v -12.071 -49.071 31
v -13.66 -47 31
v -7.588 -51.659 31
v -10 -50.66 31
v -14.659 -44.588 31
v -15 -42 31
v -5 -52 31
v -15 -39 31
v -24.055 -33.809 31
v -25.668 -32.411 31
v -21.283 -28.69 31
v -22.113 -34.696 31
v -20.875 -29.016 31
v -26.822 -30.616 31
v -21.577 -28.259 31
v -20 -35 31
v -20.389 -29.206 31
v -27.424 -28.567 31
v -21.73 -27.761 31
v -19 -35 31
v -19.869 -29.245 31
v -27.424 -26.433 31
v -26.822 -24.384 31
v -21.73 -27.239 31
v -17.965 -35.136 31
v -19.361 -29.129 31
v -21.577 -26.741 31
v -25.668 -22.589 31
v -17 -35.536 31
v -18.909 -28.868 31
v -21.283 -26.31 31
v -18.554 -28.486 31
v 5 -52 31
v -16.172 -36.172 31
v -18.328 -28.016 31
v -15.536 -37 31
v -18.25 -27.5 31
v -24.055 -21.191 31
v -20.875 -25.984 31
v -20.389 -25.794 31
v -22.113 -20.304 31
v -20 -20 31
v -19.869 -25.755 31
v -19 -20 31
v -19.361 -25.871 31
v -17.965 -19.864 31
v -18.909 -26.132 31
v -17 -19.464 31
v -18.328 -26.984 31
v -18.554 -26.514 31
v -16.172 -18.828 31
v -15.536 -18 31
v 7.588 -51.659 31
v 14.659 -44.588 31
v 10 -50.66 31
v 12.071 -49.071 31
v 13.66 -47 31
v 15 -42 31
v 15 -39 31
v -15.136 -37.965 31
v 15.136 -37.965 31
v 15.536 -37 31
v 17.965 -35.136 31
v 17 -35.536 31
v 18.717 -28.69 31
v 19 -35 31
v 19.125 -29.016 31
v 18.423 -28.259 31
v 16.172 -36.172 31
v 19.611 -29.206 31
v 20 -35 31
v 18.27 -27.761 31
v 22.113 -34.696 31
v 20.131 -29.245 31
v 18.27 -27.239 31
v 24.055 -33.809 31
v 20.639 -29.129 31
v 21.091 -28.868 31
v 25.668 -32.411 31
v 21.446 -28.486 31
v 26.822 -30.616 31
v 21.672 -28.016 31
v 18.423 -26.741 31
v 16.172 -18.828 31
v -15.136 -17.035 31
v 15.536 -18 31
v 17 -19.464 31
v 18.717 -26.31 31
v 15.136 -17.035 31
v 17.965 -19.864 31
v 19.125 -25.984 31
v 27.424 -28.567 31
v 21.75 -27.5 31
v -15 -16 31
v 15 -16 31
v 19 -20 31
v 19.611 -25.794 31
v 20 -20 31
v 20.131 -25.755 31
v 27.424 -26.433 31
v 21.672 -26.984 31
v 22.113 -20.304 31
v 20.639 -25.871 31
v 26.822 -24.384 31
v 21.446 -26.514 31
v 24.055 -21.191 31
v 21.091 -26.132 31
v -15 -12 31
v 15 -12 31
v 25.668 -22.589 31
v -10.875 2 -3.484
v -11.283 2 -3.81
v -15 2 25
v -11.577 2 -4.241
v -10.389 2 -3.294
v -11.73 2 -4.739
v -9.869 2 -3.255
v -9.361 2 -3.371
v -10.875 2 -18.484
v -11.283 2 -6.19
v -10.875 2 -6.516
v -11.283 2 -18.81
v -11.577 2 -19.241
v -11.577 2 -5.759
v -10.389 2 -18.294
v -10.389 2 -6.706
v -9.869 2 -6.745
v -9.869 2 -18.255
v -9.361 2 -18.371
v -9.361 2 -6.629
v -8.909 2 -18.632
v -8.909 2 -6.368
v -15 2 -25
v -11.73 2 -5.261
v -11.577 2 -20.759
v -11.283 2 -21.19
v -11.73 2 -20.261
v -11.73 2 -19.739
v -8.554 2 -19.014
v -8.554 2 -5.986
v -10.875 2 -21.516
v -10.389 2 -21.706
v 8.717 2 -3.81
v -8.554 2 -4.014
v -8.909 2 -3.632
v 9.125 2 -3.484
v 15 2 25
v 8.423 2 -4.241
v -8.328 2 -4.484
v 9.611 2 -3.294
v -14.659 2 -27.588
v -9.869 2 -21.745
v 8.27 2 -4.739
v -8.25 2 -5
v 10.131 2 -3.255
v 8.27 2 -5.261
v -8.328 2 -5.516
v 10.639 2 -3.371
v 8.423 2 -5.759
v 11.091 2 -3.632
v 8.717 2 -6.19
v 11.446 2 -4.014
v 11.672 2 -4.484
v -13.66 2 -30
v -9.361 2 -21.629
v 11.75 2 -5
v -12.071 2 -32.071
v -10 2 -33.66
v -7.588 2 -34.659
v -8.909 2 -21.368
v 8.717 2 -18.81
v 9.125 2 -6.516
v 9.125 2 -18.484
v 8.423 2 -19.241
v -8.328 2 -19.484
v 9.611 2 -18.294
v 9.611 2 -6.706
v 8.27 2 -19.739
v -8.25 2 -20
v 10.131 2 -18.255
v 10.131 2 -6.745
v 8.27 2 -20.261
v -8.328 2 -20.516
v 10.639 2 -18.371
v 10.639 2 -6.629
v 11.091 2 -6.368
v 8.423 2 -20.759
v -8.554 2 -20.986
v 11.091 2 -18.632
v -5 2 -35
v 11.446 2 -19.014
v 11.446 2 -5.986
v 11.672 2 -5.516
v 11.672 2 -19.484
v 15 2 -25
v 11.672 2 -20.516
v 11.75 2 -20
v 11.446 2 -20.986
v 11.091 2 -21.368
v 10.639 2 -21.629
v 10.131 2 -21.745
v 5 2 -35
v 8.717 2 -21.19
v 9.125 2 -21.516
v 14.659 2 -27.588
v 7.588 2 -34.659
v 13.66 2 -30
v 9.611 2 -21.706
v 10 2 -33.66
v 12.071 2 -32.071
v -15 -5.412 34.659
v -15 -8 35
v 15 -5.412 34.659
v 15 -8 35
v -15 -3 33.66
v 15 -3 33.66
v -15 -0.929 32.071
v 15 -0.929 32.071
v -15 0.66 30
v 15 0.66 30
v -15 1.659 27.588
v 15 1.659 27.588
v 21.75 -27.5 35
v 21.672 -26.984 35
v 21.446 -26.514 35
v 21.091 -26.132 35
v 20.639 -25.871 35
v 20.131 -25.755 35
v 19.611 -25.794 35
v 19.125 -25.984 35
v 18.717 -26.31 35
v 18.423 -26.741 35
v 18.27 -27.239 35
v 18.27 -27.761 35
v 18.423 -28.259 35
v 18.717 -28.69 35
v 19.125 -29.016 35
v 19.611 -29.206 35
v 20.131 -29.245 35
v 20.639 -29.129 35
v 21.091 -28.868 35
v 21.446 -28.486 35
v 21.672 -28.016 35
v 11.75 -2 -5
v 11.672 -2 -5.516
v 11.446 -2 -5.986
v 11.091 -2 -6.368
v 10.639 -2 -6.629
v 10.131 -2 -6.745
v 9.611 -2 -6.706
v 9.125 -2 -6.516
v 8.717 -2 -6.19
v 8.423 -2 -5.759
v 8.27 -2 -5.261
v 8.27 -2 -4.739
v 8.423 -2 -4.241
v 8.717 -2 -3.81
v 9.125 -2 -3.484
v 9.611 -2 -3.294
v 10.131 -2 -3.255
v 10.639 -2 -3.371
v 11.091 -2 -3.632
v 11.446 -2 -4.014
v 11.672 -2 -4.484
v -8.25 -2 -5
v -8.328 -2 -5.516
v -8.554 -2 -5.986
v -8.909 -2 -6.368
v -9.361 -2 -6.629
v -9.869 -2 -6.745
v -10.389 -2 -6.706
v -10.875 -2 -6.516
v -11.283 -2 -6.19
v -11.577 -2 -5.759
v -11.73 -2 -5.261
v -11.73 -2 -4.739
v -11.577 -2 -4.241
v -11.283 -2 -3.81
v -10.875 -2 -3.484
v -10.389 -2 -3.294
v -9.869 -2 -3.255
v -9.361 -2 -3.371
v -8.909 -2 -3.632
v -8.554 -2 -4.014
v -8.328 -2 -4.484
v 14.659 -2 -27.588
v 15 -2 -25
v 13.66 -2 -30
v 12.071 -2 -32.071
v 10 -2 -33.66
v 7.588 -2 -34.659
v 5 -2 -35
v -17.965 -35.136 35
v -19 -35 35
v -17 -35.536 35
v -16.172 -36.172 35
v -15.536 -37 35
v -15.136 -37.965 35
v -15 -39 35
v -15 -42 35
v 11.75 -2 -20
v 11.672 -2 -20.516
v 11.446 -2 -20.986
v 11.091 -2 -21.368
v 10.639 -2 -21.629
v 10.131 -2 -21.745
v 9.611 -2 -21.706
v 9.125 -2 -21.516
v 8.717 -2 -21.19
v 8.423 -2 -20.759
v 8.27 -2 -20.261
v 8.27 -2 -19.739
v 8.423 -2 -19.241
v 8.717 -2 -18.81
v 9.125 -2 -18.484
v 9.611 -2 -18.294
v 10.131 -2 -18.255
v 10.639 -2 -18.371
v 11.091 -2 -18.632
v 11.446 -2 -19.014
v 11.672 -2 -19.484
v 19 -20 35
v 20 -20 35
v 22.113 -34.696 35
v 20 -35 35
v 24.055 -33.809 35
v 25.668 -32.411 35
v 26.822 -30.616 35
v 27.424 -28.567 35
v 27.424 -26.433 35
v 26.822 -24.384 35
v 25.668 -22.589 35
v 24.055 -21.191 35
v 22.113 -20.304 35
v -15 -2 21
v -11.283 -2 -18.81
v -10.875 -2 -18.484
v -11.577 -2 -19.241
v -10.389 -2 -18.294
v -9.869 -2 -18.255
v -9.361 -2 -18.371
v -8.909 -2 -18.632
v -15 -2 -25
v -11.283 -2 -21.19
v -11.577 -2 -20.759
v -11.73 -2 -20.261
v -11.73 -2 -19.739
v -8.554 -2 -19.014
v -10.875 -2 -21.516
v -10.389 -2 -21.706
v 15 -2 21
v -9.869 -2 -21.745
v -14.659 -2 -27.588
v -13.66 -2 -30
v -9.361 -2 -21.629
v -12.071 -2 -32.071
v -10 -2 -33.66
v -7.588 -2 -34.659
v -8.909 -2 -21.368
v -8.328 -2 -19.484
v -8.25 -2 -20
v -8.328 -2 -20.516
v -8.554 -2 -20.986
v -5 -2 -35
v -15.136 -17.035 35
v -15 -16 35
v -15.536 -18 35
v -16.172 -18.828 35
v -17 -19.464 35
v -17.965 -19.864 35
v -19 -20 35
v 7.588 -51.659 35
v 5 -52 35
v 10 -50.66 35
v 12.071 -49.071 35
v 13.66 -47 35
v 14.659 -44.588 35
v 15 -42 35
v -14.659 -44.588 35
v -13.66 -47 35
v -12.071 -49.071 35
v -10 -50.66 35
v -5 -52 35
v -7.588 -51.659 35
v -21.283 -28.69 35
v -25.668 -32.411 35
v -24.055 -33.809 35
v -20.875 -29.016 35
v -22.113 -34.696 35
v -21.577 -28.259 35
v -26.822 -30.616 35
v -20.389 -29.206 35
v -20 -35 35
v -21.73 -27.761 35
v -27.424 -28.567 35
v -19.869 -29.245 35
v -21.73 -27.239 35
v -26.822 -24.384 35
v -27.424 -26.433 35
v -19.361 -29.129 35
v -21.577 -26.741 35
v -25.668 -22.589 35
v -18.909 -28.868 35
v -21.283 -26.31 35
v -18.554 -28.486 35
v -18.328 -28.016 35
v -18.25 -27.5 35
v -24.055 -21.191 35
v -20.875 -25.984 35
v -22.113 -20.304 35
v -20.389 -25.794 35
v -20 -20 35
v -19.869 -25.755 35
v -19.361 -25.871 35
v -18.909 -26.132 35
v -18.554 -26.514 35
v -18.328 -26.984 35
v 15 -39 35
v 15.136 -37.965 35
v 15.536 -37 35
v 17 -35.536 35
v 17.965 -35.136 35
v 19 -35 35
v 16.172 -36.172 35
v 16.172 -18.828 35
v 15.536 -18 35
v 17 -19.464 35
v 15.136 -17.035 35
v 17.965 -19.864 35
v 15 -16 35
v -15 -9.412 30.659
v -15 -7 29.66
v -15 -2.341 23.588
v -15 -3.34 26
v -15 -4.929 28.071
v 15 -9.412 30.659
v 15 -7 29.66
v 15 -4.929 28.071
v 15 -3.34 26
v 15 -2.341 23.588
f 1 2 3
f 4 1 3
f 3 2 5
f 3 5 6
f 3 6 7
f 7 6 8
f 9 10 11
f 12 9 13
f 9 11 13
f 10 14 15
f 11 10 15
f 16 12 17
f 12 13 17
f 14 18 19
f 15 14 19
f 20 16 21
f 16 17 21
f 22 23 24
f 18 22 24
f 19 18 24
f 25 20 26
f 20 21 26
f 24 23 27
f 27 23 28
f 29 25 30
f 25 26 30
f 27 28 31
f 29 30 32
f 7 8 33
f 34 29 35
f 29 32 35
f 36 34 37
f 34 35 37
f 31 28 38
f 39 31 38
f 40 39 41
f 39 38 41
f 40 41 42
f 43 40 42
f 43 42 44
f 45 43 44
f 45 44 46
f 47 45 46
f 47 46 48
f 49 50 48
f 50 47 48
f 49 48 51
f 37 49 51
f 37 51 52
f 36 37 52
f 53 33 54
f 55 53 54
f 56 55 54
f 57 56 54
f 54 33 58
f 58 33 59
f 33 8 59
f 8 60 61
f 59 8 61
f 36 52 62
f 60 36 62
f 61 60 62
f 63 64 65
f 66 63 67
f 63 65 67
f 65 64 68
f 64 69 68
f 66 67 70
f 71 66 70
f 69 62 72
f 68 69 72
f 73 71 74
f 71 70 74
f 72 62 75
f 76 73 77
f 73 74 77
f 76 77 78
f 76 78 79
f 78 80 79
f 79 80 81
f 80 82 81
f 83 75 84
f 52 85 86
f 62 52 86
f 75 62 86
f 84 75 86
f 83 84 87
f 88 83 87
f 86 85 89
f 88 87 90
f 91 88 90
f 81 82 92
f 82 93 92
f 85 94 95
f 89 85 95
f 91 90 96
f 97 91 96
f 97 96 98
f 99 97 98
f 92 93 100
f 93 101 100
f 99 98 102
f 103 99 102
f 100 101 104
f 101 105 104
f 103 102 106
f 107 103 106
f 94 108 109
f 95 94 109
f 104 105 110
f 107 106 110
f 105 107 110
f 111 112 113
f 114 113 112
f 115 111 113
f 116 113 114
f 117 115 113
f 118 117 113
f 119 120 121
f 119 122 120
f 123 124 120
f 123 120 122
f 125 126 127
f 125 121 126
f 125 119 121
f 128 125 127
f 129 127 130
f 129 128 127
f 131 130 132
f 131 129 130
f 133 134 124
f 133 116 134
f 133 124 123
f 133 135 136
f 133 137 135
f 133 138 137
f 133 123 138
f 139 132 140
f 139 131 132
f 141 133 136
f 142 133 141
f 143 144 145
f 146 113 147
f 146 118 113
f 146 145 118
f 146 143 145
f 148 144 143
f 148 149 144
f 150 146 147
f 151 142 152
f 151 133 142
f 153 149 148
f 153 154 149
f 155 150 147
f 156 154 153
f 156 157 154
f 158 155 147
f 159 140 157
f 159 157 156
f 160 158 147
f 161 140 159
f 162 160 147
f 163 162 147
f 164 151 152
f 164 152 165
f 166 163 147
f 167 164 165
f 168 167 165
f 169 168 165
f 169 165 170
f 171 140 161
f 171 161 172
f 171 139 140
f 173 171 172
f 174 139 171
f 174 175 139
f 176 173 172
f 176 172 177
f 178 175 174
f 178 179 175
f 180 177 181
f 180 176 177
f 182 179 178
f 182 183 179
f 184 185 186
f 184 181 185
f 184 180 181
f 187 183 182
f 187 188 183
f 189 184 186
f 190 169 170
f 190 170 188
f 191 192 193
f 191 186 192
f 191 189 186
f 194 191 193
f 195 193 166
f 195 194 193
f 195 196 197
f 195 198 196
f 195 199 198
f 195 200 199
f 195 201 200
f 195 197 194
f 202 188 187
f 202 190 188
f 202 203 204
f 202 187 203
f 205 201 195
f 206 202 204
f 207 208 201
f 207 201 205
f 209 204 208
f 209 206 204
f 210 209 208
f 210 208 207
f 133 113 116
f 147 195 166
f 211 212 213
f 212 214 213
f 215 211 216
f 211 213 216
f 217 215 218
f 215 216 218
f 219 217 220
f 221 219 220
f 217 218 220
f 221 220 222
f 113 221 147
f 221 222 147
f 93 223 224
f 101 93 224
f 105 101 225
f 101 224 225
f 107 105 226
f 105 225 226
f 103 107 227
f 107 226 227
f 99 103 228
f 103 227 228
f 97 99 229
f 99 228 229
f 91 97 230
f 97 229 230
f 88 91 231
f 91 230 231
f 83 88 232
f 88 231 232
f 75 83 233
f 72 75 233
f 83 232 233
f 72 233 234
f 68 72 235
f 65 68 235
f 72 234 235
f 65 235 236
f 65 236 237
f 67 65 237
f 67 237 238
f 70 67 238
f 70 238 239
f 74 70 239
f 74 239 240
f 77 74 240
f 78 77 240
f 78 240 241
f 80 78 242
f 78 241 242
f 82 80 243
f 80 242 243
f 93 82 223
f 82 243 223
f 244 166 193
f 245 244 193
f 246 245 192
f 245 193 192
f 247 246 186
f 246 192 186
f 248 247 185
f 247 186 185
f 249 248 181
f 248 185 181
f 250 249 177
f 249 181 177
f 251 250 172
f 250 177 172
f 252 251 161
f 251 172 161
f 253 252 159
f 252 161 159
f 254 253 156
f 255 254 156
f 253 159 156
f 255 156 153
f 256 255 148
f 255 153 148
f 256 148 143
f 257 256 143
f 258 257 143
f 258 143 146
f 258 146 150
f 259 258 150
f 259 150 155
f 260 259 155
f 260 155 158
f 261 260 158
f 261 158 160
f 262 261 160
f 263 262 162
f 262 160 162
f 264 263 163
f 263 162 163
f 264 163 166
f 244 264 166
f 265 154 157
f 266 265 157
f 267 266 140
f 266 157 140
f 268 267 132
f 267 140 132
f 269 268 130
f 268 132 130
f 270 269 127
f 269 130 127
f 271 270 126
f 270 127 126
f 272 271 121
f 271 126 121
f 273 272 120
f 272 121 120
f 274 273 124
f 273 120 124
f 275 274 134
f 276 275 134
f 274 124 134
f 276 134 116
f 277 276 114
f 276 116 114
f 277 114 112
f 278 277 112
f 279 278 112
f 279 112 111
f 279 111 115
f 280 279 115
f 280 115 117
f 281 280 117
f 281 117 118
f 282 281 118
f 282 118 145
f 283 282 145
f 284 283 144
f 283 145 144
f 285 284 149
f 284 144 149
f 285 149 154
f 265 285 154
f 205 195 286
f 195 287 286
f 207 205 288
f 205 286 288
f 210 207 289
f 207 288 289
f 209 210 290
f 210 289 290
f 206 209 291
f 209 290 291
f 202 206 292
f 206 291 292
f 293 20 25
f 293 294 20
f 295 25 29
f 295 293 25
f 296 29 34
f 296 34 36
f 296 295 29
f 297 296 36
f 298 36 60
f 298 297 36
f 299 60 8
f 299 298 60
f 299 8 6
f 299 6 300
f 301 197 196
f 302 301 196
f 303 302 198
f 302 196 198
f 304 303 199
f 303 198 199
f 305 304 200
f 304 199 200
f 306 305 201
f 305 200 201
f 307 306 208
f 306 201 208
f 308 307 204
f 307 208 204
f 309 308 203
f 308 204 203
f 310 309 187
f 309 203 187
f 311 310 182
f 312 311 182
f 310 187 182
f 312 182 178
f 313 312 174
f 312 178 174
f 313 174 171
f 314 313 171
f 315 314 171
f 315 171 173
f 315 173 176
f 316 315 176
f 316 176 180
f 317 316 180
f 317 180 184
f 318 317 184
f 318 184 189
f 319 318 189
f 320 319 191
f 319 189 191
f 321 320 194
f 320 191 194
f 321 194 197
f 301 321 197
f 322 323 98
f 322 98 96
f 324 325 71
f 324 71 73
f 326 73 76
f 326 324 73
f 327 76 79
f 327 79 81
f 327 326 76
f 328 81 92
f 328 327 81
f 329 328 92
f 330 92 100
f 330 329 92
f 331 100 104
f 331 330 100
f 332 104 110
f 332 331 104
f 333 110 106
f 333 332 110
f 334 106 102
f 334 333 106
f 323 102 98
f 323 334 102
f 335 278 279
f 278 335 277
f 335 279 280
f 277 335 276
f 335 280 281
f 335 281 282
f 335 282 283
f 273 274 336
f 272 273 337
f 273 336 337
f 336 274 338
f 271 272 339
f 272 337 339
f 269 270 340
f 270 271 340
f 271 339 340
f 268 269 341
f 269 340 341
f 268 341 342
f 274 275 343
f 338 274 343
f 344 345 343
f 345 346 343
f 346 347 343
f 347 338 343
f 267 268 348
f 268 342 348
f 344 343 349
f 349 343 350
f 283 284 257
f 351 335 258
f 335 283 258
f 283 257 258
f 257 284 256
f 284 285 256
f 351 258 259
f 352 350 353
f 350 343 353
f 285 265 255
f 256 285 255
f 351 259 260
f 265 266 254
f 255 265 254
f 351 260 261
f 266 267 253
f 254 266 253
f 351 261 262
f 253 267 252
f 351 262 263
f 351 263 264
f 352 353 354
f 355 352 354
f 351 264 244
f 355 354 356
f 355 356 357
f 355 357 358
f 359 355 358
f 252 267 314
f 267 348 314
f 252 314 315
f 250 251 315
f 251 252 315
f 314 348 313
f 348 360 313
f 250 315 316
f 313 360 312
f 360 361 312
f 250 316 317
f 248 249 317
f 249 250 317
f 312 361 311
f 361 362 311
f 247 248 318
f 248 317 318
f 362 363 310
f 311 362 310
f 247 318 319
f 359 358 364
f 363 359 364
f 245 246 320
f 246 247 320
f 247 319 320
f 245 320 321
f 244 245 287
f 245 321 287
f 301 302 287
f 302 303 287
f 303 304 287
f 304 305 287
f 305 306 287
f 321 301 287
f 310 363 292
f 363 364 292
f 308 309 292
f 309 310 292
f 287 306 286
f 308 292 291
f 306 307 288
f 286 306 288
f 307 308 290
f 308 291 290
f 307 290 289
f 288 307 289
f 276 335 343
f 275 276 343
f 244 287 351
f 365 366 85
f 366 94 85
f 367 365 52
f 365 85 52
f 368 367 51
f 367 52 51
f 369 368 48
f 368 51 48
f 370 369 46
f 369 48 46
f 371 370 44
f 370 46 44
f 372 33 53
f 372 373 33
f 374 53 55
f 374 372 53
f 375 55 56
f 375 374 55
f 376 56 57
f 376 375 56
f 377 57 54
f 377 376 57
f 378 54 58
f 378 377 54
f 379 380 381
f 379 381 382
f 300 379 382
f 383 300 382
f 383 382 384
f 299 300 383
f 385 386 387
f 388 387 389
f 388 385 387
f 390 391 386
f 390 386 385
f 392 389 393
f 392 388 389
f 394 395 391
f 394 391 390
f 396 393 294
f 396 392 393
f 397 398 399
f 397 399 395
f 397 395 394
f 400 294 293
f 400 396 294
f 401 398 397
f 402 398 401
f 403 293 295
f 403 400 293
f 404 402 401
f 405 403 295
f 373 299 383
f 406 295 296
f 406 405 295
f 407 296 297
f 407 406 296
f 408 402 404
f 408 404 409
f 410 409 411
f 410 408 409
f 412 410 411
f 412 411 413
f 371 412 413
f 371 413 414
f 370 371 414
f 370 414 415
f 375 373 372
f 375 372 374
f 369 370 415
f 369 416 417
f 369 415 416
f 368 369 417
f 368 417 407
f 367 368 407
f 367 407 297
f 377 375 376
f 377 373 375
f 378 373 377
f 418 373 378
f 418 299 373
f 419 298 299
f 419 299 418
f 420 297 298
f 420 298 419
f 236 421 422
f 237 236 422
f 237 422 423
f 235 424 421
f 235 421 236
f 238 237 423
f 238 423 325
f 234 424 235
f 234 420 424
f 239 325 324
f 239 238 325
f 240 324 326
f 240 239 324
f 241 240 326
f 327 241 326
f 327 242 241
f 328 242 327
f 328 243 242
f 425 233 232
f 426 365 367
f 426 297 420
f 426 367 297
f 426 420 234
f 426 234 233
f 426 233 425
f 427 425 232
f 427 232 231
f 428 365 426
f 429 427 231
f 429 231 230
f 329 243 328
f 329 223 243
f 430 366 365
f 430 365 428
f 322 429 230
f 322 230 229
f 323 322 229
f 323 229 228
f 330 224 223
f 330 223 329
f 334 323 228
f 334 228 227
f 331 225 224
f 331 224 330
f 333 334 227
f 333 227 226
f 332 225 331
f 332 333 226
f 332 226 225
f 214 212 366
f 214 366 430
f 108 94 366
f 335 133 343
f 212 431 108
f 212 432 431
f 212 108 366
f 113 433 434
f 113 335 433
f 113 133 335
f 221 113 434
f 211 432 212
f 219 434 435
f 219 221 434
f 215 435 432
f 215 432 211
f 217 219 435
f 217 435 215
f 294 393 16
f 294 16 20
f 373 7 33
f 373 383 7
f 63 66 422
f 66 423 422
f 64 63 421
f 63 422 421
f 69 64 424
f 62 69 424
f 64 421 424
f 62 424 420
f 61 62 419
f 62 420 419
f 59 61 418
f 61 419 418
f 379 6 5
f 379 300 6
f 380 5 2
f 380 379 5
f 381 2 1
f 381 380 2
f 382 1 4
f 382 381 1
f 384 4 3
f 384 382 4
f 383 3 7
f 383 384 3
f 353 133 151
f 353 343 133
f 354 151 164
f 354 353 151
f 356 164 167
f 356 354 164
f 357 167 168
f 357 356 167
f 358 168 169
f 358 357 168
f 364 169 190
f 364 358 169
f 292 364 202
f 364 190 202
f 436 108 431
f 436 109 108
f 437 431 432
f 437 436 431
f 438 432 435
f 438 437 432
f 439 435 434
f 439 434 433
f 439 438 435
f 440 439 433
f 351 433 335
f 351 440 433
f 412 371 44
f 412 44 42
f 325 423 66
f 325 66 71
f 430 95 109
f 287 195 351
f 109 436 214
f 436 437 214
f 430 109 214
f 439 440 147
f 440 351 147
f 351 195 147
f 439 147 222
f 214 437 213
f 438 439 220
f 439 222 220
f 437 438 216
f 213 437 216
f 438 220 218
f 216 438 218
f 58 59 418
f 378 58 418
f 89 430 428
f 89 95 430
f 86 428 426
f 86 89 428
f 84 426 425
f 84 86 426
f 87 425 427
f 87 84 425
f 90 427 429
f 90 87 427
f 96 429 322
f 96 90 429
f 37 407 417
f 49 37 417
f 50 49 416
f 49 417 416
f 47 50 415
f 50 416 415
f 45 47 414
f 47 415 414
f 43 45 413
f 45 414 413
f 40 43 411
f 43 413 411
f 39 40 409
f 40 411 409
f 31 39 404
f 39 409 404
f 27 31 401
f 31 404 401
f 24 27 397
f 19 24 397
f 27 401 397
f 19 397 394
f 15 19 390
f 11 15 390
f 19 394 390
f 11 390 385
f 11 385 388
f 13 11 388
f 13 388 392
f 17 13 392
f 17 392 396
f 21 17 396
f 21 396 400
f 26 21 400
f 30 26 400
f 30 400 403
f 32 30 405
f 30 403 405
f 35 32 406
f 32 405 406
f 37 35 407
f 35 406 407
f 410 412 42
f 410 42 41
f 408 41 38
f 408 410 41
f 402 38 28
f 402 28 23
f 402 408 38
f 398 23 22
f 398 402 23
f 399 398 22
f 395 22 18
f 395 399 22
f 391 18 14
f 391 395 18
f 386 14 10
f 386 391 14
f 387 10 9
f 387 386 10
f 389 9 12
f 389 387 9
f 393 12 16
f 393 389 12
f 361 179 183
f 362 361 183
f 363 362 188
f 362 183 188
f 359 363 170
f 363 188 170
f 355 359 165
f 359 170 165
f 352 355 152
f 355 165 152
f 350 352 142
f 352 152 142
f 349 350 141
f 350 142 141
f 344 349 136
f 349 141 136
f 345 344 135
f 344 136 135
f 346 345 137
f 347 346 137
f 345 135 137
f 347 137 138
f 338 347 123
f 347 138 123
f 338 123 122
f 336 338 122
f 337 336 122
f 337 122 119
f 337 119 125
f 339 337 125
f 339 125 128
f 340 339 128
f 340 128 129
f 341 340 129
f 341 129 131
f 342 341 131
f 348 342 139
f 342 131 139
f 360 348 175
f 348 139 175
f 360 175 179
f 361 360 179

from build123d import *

# Parameters (mm, degrees)
SKETCH1_W            = 30
SKETCH1_H            = 70
BOSS_EXTRUDE1_DEPTH  = 2
SKETCH2_W            = 30
SKETCH2_H            = 4
BOSS_EXTRUDE2_DEPTH  = 50
SKETCH3_R            = 1.75
BOSS_EXTRUDE3_DEPTH  = 4
SKETCH4_R            = 1.75
CUT_EXTRUDE1_DEPTH   = 4
LPATTERN1_COUNT      = 2
LPATTERN1_PITCH      = 15
LPATTERN1_COUNT_DIR2 = 2
LPATTERN1_PITCH_DIR2 = 20
FILLET1_R            = 10
FILLET2_R            = 4


with BuildPart() as part:
    # Sketch1 → Boss-Extrude1 (new body, symmetric)
    with BuildSketch(Plane(origin=(0, 0, 0), x_dir=(1, 0, 0), z_dir=(0, 1, 0))):
        Rectangle(SKETCH1_W, SKETCH1_H)
    extrude(amount=BOSS_EXTRUDE1_DEPTH, both=True)

    # Sketch2 → Boss-Extrude2 (add)
    with BuildSketch(Plane.XZ.offset(2)):
        with Locations((0, 33)):
            Rectangle(SKETCH2_W, SKETCH2_H)
    extrude(amount=BOSS_EXTRUDE2_DEPTH)

    # Sketch3 → Boss-Extrude3 (add)
    with BuildSketch(Plane.XY.offset(35)):
        with BuildLine():
            Line((20, -20), (-20, -20))
            ThreePointArc((-20, -20), (-27.5, -27.5), (-20, -35))
            Line((-20, -35), (20, -35))
            ThreePointArc((20, -35), (27.5, -27.5), (20, -20))
        make_face()
        with Locations((-20, -27.5)):
            Circle(SKETCH3_R, mode=Mode.SUBTRACT)
        with Locations((20, -27.5)):
            Circle(SKETCH3_R, mode=Mode.SUBTRACT)
    extrude(amount=-BOSS_EXTRUDE3_DEPTH)

    # Sketch4 → Cut-Extrude1 (cut)
    with BuildSketch(Plane(origin=(0, 2, 0), x_dir=(1, 0, 0), z_dir=(0, 1, 0))):
        with Locations((-10, 20)):
            Circle(SKETCH4_R)
    cut_extrude1 = extrude(amount=-CUT_EXTRUDE1_DEPTH, mode=Mode.SUBTRACT)

    # LPattern1: Cut-Extrude1 2 × 2
    with Locations(*[(j * LPATTERN1_PITCH_DIR2, 0, i * LPATTERN1_PITCH) for i in range(LPATTERN1_COUNT) for j in range(LPATTERN1_COUNT_DIR2) if (i, j) != (0, 0)]):
        add(cut_extrude1, mode=Mode.SUBTRACT)

    # Fillet1
    fillet1_edges = [part.edges().sort_by_distance(p)[0] for p in [
        (0, -2, 31),
        (15, -52, 33),
        (0, 2, 35),
        (-15, -52, 33),
        (-15, 0, -35),
        (15, 0, -35),
    ]]
    fillet(fillet1_edges, radius=FILLET1_R)

    # Fillet2
    fillet2_edges = [part.edges().sort_by_distance(p)[0] for p in [
        (15, -35, 33),
        (-15, -35, 33),
        (15, -20, 33),
        (-15, -20, 33),
    ]]
    fillet(fillet2_edges, radius=FILLET2_R)


solid = part.part
